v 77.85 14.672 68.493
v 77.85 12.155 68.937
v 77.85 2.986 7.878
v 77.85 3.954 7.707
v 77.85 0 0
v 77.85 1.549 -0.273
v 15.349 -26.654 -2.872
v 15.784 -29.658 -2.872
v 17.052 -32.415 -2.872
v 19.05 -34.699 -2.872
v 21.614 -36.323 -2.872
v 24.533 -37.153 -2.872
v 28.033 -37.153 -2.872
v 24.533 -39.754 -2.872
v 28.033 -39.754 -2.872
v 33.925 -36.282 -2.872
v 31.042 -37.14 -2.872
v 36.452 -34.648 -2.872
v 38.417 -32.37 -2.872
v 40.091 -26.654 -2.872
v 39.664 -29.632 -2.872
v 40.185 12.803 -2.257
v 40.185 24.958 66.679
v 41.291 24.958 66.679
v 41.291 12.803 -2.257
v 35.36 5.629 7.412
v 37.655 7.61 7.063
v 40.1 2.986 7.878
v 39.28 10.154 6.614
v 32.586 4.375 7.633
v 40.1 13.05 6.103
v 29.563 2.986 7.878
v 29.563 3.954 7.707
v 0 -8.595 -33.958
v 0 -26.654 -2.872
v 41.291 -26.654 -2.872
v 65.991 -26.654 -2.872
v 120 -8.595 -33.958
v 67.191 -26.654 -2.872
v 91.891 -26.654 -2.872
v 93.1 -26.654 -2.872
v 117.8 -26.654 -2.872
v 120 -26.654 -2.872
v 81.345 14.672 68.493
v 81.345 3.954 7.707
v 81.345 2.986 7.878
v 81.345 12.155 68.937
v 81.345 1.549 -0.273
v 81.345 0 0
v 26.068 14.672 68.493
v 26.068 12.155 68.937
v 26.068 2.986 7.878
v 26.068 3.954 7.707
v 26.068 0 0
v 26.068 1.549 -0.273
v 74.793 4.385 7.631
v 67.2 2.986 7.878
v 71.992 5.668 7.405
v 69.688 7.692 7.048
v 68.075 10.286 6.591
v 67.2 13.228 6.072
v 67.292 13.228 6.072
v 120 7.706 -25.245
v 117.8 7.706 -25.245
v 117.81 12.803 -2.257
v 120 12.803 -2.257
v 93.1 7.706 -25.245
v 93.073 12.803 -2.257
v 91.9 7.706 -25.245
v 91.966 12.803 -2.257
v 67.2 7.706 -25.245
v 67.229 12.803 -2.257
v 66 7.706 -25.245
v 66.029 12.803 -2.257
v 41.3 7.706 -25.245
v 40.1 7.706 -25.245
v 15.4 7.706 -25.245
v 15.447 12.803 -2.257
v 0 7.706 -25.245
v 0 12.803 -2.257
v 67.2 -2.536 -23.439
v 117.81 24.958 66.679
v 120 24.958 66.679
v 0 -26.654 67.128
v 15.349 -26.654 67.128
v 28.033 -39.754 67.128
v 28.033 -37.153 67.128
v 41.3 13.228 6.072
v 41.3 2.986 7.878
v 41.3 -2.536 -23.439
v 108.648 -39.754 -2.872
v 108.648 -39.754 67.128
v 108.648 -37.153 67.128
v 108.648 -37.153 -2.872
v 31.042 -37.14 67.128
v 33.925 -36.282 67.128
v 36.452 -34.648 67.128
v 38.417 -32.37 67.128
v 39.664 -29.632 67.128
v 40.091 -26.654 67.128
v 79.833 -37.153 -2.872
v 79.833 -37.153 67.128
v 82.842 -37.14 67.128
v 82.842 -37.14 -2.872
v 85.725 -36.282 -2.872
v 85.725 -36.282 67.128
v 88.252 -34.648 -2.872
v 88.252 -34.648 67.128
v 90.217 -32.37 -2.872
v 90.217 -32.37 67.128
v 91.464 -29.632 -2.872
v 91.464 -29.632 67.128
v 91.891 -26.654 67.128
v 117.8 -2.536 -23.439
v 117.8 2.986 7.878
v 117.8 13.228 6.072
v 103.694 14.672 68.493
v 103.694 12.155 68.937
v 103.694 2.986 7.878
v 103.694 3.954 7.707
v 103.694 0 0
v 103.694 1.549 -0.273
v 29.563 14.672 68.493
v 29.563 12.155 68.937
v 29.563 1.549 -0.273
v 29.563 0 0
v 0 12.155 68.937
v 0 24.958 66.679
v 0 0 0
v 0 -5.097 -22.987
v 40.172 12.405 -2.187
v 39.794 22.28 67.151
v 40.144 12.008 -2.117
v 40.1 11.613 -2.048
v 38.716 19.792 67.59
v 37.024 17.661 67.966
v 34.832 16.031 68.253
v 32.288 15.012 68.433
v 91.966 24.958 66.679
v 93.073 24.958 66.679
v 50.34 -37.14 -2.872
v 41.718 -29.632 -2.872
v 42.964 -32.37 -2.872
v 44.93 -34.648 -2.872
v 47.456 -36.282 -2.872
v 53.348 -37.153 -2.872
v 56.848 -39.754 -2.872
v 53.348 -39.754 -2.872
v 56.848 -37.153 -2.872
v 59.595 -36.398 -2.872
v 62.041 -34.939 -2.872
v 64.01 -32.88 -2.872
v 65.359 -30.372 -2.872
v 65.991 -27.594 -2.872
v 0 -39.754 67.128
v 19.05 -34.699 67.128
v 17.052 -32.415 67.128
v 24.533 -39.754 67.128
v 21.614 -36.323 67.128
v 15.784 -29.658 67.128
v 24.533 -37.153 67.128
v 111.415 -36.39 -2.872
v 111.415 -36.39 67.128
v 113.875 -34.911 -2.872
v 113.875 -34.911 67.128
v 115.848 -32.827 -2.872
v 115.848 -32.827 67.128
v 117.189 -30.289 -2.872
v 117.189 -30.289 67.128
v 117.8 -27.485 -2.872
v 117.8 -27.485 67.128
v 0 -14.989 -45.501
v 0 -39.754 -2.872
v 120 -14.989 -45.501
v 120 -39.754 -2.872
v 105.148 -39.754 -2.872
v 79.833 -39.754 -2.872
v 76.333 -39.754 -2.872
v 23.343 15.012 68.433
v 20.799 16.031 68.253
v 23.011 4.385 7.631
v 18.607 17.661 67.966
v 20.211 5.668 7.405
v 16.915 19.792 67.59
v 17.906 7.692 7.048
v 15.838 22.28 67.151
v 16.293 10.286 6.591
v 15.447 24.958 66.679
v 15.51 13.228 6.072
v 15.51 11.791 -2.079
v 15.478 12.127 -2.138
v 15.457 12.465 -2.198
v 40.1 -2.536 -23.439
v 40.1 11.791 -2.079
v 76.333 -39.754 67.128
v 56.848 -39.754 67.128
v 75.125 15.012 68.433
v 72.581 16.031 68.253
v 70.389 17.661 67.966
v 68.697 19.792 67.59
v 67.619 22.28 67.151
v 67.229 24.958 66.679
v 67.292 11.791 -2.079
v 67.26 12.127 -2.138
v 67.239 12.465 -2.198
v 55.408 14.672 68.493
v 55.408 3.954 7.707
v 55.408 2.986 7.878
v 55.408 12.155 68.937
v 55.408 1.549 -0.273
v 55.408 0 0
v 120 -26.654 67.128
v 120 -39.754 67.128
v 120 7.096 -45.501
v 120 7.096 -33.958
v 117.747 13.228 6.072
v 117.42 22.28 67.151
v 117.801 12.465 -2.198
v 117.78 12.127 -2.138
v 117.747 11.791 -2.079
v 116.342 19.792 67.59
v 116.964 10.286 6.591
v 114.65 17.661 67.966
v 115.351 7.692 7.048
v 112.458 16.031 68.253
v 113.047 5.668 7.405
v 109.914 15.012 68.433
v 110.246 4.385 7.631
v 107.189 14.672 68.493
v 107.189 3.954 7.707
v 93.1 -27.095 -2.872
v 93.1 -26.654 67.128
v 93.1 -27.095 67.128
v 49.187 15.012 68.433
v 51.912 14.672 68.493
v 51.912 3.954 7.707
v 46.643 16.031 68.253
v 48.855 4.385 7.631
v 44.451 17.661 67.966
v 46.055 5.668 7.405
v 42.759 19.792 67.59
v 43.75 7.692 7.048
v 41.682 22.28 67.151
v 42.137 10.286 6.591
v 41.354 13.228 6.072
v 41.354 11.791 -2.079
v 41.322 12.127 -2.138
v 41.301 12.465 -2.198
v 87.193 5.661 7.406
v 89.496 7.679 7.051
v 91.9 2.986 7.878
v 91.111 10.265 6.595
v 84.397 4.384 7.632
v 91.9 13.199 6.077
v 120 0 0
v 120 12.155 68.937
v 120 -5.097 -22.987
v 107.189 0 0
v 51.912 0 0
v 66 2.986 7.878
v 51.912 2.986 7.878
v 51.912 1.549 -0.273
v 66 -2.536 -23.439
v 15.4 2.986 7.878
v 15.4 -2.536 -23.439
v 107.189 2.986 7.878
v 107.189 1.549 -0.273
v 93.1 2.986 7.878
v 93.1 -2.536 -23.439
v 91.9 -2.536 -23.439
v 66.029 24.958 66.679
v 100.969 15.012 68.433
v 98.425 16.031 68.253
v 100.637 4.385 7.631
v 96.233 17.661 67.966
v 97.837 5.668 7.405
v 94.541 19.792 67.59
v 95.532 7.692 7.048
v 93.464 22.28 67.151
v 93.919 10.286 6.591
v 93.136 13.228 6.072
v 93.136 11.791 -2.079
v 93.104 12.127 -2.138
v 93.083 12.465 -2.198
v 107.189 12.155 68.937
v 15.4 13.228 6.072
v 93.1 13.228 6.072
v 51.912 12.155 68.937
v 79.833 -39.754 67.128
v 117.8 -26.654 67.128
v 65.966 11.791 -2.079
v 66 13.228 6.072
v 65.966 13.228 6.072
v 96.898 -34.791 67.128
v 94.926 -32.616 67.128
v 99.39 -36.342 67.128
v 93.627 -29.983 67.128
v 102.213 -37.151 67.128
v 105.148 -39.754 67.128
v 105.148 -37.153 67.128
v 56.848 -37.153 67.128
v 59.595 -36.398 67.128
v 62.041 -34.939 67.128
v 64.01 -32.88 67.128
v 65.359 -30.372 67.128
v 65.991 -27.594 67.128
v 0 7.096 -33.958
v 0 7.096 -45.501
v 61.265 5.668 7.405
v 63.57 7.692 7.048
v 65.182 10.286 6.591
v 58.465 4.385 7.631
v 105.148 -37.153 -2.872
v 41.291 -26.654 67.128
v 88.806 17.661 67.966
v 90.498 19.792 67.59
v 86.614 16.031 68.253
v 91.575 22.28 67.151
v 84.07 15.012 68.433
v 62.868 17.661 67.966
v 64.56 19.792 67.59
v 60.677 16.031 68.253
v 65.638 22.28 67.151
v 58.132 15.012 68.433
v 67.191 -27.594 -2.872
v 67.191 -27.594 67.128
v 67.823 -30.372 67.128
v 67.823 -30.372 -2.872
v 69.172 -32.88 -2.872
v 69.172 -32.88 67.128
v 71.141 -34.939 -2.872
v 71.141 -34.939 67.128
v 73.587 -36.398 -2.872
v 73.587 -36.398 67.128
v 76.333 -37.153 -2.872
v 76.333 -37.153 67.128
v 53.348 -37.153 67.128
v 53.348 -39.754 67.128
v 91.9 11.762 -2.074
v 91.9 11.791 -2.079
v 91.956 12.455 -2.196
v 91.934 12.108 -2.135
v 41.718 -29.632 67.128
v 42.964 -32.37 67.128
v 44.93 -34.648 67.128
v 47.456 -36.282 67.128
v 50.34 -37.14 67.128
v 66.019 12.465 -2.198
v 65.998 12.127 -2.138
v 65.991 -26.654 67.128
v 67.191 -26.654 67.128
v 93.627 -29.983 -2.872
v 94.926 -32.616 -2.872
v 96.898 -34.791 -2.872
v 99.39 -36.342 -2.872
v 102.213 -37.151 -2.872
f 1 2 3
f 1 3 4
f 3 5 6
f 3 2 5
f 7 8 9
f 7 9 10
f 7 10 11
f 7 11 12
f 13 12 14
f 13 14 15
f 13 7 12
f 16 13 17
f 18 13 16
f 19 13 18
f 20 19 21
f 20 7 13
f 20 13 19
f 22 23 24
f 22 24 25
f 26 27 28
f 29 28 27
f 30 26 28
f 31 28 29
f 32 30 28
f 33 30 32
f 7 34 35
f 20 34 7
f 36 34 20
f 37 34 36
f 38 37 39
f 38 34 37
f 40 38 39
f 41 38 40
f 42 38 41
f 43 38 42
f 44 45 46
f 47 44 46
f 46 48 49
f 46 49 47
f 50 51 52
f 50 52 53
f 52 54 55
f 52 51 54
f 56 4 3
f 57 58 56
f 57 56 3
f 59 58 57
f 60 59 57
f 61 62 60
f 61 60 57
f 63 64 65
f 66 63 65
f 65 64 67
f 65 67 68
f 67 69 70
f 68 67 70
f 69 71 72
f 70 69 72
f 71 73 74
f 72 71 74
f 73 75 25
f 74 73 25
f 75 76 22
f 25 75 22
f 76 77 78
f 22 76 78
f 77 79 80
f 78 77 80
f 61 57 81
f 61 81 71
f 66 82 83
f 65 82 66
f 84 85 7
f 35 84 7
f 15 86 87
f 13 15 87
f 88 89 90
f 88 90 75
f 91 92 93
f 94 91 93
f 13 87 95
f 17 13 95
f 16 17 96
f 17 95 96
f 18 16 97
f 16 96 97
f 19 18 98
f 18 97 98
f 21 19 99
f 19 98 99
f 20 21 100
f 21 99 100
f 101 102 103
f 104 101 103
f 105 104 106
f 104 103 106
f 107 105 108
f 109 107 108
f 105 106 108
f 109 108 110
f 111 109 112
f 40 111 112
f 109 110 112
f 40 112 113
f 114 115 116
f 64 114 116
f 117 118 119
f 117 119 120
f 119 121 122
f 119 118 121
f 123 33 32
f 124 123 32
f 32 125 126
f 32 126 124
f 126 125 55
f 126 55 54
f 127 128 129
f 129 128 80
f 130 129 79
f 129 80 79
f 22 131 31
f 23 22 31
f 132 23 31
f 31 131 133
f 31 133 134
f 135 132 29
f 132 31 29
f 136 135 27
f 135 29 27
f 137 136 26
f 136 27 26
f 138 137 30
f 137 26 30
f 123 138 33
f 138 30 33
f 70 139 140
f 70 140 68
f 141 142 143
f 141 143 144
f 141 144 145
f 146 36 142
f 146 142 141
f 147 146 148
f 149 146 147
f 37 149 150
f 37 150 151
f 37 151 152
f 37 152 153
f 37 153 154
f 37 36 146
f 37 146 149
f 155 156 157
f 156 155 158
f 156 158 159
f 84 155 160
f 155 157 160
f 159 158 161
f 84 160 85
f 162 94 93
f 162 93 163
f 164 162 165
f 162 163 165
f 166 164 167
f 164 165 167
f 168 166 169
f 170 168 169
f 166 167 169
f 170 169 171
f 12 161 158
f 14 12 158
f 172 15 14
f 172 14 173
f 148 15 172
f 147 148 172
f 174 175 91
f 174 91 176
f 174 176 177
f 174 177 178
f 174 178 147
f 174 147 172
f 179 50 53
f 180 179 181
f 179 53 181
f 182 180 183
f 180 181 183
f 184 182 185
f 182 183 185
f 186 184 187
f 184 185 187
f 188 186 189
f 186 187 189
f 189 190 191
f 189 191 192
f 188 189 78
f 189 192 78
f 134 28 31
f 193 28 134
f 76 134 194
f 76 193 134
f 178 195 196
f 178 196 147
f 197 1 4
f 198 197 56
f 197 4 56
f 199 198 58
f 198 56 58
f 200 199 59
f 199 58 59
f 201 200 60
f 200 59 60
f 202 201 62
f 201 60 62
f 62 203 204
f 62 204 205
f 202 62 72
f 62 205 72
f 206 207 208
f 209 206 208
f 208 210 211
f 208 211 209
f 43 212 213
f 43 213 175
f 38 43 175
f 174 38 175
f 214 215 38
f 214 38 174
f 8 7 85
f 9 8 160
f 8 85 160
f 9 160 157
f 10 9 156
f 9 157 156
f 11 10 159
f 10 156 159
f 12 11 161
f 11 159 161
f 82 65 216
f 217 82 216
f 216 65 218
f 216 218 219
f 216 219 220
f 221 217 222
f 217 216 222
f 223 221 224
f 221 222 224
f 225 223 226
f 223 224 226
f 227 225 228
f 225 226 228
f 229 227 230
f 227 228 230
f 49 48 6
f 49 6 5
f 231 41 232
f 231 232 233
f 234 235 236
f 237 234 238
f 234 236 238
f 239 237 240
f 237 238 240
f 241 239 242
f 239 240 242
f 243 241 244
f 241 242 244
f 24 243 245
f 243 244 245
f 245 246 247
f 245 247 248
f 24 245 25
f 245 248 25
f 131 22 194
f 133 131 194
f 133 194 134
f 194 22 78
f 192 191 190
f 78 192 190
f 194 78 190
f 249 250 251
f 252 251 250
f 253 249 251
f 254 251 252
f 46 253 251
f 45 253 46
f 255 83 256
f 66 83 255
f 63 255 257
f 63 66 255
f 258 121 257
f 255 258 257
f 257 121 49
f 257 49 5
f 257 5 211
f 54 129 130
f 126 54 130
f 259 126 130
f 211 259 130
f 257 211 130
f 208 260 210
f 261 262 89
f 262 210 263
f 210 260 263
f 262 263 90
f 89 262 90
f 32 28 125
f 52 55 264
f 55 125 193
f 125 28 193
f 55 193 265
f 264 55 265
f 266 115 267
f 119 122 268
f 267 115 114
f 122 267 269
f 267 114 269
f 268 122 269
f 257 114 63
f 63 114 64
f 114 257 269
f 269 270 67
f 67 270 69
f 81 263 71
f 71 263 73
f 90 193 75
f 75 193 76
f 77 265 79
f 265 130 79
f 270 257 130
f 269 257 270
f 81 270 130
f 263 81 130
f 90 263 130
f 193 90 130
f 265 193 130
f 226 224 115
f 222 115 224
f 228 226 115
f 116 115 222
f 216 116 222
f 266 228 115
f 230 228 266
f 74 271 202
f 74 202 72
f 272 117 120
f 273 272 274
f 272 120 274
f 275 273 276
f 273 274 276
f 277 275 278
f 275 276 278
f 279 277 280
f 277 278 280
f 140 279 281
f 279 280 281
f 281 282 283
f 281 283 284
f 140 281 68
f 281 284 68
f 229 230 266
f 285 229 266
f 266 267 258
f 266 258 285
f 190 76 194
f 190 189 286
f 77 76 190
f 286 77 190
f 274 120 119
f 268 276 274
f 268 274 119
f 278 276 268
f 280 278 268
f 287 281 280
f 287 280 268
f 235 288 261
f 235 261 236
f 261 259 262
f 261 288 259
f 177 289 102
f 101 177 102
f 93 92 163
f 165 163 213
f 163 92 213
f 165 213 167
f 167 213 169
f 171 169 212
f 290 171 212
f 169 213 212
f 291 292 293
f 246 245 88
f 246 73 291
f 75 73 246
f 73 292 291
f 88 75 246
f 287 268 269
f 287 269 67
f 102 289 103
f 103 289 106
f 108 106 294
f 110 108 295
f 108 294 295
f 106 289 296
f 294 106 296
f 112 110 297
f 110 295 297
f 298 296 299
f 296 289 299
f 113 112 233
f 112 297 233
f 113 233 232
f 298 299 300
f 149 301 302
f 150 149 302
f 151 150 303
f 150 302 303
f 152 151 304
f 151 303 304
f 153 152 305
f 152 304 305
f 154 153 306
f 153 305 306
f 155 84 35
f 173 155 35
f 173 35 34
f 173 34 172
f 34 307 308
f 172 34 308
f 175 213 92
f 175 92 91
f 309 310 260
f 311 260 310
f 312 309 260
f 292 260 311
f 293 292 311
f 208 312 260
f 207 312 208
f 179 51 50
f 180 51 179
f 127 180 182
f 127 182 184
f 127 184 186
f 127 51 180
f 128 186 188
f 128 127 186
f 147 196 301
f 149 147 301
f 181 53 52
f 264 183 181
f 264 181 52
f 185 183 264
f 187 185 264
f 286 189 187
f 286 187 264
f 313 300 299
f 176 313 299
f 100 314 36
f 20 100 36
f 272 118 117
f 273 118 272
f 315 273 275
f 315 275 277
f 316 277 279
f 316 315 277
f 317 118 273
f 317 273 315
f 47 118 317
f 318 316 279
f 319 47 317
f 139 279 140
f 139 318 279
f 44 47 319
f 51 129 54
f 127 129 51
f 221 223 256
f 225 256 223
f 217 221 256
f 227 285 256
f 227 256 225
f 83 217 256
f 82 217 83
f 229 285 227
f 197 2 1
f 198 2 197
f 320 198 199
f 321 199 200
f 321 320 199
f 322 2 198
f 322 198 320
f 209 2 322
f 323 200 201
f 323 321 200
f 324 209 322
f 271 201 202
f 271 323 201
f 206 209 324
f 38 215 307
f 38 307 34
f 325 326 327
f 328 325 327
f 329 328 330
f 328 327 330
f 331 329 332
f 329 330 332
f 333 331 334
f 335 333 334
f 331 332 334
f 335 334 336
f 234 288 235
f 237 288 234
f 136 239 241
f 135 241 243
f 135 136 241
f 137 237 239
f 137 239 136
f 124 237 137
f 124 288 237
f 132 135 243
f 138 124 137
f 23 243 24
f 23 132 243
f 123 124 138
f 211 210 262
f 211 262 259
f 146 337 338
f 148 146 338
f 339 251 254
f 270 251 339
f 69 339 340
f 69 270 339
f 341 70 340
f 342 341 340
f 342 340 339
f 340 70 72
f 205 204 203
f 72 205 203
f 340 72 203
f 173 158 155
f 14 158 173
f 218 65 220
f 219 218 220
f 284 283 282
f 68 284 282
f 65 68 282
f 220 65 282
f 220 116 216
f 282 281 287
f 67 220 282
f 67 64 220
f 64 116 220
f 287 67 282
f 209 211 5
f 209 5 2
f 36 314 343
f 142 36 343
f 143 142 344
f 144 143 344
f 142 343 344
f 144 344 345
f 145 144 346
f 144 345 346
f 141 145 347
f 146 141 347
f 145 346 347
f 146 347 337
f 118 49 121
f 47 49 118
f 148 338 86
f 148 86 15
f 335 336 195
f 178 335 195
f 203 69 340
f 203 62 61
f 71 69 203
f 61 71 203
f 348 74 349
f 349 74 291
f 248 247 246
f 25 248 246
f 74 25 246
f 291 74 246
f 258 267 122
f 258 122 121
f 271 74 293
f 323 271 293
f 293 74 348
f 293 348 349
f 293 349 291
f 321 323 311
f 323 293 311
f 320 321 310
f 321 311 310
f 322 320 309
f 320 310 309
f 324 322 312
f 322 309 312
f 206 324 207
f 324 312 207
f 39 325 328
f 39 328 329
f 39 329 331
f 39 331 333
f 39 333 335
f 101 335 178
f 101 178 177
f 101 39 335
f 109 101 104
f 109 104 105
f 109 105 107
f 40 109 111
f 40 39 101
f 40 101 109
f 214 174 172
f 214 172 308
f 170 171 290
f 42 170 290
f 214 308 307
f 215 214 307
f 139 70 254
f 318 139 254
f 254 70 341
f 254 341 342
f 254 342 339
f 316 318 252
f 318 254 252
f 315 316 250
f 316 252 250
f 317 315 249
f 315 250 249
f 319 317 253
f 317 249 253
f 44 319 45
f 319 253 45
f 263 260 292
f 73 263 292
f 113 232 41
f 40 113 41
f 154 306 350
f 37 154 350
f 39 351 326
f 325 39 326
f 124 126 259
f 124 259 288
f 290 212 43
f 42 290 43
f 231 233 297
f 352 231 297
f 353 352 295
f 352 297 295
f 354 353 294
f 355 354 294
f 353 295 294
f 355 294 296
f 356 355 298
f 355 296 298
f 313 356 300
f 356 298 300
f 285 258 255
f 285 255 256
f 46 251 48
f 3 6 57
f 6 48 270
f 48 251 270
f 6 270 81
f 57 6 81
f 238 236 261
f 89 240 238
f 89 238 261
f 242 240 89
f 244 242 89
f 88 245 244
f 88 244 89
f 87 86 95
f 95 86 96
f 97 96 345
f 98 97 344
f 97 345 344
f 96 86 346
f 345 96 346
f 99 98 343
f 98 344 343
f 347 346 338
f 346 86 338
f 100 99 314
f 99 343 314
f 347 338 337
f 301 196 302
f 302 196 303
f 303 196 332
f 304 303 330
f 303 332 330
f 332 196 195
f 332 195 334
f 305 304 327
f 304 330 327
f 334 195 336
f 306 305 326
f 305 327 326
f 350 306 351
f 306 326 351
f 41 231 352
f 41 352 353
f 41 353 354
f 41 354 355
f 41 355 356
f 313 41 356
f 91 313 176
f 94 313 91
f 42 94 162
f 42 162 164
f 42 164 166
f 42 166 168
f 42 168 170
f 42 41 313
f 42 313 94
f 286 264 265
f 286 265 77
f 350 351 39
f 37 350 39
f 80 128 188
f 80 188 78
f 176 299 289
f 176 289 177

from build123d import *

# Parameters (mm, degrees)
BOSS_EXTRUDE1_DEPTH = 120
CUT_EXTRUDE4_DEPTH  = 141.624117266
BOSS_EXTRUDE4_START = -120
BOSS_EXTRUDE4_DEPTH = 120
SKETCH11_W          = 24.7
SKETCH11_H          = 10.4
CUT_EXTRUDE9_DEPTH  = 31.8
BOSS_EXTRUDE5_DEPTH = 120
SKETCH14_W          = 70
SKETCH14_H          = 13.1
BOSS_EXTRUDE6_DEPTH = 120
CUT_EXTRUDE12_DEPTH = 70


with BuildPart() as part:
    # Sketch2 → Boss-Extrude1 (new body)
    with BuildSketch(Plane(origin=(0, 0, 0), x_dir=(0, 0, -1), z_dir=(1, 0, 0))):
        Polygon((-68.936542711, 12.155372437), (-66.679116401, 24.957873226), (2.25742631, 12.802500789), (0, 0), align=None)
    extrude(amount=BOSS_EXTRUDE1_DEPTH)

    # Sketch4 → Cut-Extrude4 (cut, through all)
    with BuildSketch(Plane(origin=(0, 0, 0), x_dir=(-1, 0, 0), z_dir=(0, -0.17364817766692411, -0.9848077530122092))):
        with BuildLine():
            ThreePointArc((-103.693834735, 2.555416204), (-96.232993561, 5.591063706), (-93.072776831, 13))
            Line((-93.072776831, 13), (-117.810392147, 13))
            ThreePointArc((-117.810392147, 13), (-114.650175417, 5.591063706), (-107.189334244, 2.555416204))
            Line((-107.189334244, 2.555416204), (-107.189334244, 0))
            Line((-107.189334244, 0), (-103.693834735, 0))
            Line((-103.693834735, 0), (-103.693834735, 2.555416204))
        make_face()
        with BuildLine():
            Line((-67.228656909, 13), (-91.966272224, 13))
            ThreePointArc((-91.966272224, 13), (-88.806055495, 5.591063706), (-81.345214321, 2.555416204))
            Line((-81.345214321, 2.555416204), (-81.345214321, 0))
            Line((-81.345214321, 0), (-77.849714812, 0))
            Line((-77.849714812, 0), (-77.849714812, 2.555416204))
            ThreePointArc((-77.849714812, 2.555416204), (-70.388873638, 5.591063706), (-67.228656909, 13))
        make_face()
        with BuildLine():
            Line((-41.291041594, 13), (-66.028656909, 13))
            ThreePointArc((-66.028656909, 13), (-62.86844018, 5.591063706), (-55.407599006, 2.555416204))
            Line((-55.407599006, 2.555416204), (-55.407599006, 0))
            Line((-55.407599006, 0), (-51.912099497, 0))
            Line((-51.912099497, 0), (-51.912099497, 2.555416204))
            ThreePointArc((-51.912099497, 2.555416204), (-44.451258323, 5.591063706), (-41.291041594, 13))
        make_face()
        with BuildLine():
            Line((-15.446921672, 13), (-40.184536987, 13))
            ThreePointArc((-40.184536987, 13), (-37.024320257, 5.591063706), (-29.563479084, 2.555416204))
            Line((-29.563479084, 2.555416204), (-29.563479084, 0))
            Line((-29.563479084, 0), (-26.067979575, 0))
            Line((-26.067979575, 0), (-26.067979575, 2.555416204))
            ThreePointArc((-26.067979575, 2.555416204), (-18.607138401, 5.591063706), (-15.446921672, 13))
        make_face()
    extrude(amount=-CUT_EXTRUDE4_DEPTH, mode=Mode.SUBTRACT)


with BuildPart() as cut_extrude4_piece_1:
    # of the separate pieces the step leaves, piece 1, a body of its own (cut_extrude4_pieces)
    add(part.part.solids().sort_by_distance((0, 12.155372437, 68.936542711))[0])



with BuildPart() as cut_extrude4_piece_2:
    # of the separate pieces the step leaves, piece 2, a body of its own (cut_extrude4_pieces)
    add(part.part.solids().sort_by_distance((55.407599006, 12.155372437, 68.936542711))[0])


with BuildPart() as cut_extrude4_piece_3:
    # of the separate pieces the step leaves, piece 3, a body of its own (cut_extrude4_pieces)
    add(part.part.solids().sort_by_distance((81.345214321, 12.155372437, 68.936542711))[0])


with BuildPart() as cut_extrude4_piece_4:
    # of the separate pieces the step leaves, piece 4, a body of its own (cut_extrude4_pieces)
    add(part.part.solids().sort_by_distance((29.563479084, 12.155372437, 68.936542711))[0])


with BuildPart() as cut_extrude4_piece_5:
    # of the separate pieces the step leaves, piece 5, a body of its own (cut_extrude4_pieces)
    add(part.part.solids().sort_by_distance((107.189334244, 12.155372437, 68.936542711))[0])


with BuildPart() as cut_extrude4_piece_1_1:
    add(cut_extrude4_piece_1.part)

    add(cut_extrude4_piece_2.part)  # Boss-Extrude4 merges Cut-Extrude4 piece 2

    add(cut_extrude4_piece_3.part)  # Boss-Extrude4 merges Cut-Extrude4 piece 3

    add(cut_extrude4_piece_4.part)  # Boss-Extrude4 merges Cut-Extrude4 piece 4

    add(cut_extrude4_piece_5.part)  # Boss-Extrude4 merges Cut-Extrude4 piece 5
    # Sketch5 → Boss-Extrude4 (add)
    with BuildSketch(Plane(origin=(120, 0, 0), x_dir=(0, 0, -1), z_dir=(1, 0, 0)).offset(BOSS_EXTRUDE4_START)):
        Polygon((0, 0), (22.987385459, -5.096513818), (25.244811769, 7.705986971), (2.25742631, 12.802500789), align=None)
    extrude(amount=BOSS_EXTRUDE4_DEPTH)

    # Sketch11 → Cut-Extrude9 (cut)
    with BuildSketch(Plane(origin=(0, -4.08475313, -23.165786166), x_dir=(-1, 0, 0), z_dir=(0, -0.17364817766692414, -0.9848077530122092))):
        with Locations((-105.45, 6.772631273)):
            Rectangle(SKETCH11_W, SKETCH11_H)
        with Locations((-79.55, 6.772631273)):
            Rectangle(SKETCH11_W, SKETCH11_H)
        with Locations((-53.65, 6.772631273)):
            Rectangle(SKETCH11_W, SKETCH11_H)
        with Locations((-27.75, 6.772631273)):
            Rectangle(SKETCH11_W, SKETCH11_H)
    extrude(amount=-CUT_EXTRUDE9_DEPTH, mode=Mode.SUBTRACT)


with BuildPart() as body_2:
    # Sketch13 → Boss-Extrude5 (new body)
    with BuildSketch(Plane(origin=(120, 0, 0), x_dir=(0, 0, -1), z_dir=(1, 0, 0))):
        Polygon((33.958408758, 7.096334178), (33.958408758, -8.594668686), (2.872459687, -26.654124813), (2.872459687, -39.754124813), (45.500887711, -14.989038057), (45.500887711, 7.096334178), align=None)
    extrude(amount=-BOSS_EXTRUDE5_DEPTH)

    # Sketch14 → Boss-Extrude6 (add)
    with BuildSketch(Plane(origin=(120, 0, 0), x_dir=(0, 0, -1), z_dir=(1, 0, 0))):
        with Locations((-32.127540313, -33.204124813)):
            Rectangle(SKETCH14_W, SKETCH14_H)
    extrude(amount=-BOSS_EXTRUDE6_DEPTH)

    # Sketch15 → Cut-Extrude12 (cut)
    with BuildSketch(Plane.XY.offset(67.127540313)):
        with BuildLine():
            ThreePointArc((28.033260622, -37.153434464), (36.451781652, -34.648191148), (40.090826011, -26.654124813))
            Line((40.090826011, -26.654124813), (15.349014314, -26.654124813))
            ThreePointArc((15.349014314, -26.654124813), (17.969088097, -33.628809866), (24.533260622, -37.153388888))
            Line((24.533260622, -37.153388888), (24.533260622, -39.754124813))
            Line((24.533260622, -39.754124813), (28.033260622, -39.754124813))
            Line((28.033260622, -39.754124813), (28.033260622, -37.153434464))
        make_face()
        with BuildLine():
            Line((65.990826011, -27.594395238), (65.990826011, -26.654124813))
            Line((65.990826011, -26.654124813), (41.290826011, -26.654124813))
            ThreePointArc((41.290826011, -26.654124813), (44.92987037, -34.648191148), (53.348391401, -37.153434464))
            Line((53.348391401, -37.153434464), (53.348391401, -39.754124813))
            Line((53.348391401, -39.754124813), (56.848391401, -39.754124813))
            Line((56.848391401, -39.754124813), (56.848391401, -37.153388888))
            ThreePointArc((56.848391401, -37.153388888), (63.094850175, -33.976130347), (65.990826011, -27.594395238))
        make_face()
        with BuildLine():
            Line((91.890826011, -26.654124813), (67.190826011, -26.654124813))
            Line((67.190826011, -26.654124813), (67.190826011, -27.594395238))
            ThreePointArc((67.190826011, -27.594395238), (70.086801847, -33.976130347), (76.333260622, -37.153388888))
            Line((76.333260622, -37.153388888), (76.333260622, -39.754124813))
            Line((76.333260622, -39.754124813), (79.833260622, -39.754124813))
            Line((79.833260622, -39.754124813), (79.833260622, -37.153434464))
            ThreePointArc((79.833260622, -37.153434464), (88.251781652, -34.648191148), (91.890826011, -26.654124813))
        make_face()
        with BuildLine():
            Line((105.148391401, -37.153434464), (105.148391401, -39.754124813))
            Line((105.148391401, -39.754124813), (108.648391401, -39.754124813))
            Line((108.648391401, -39.754124813), (108.648391401, -37.153388888))
            ThreePointArc((108.648391401, -37.153388888), (114.932671804, -33.936379858), (117.8, -27.485042299))
            Line((117.8, -27.485042299), (117.8, -26.654124813))
            Line((117.8, -26.654124813), (93.1, -26.654124813))
            Line((93.1, -26.654124813), (93.1, -27.095037956))
            ThreePointArc((93.1, -27.095037956), (96.897671555, -34.79126513), (105.148391401, -37.153434464))
        make_face()
    extrude(amount=-CUT_EXTRUDE12_DEPTH, mode=Mode.SUBTRACT)


solid = Compound([cut_extrude4_piece_1_1.part, body_2.part])
